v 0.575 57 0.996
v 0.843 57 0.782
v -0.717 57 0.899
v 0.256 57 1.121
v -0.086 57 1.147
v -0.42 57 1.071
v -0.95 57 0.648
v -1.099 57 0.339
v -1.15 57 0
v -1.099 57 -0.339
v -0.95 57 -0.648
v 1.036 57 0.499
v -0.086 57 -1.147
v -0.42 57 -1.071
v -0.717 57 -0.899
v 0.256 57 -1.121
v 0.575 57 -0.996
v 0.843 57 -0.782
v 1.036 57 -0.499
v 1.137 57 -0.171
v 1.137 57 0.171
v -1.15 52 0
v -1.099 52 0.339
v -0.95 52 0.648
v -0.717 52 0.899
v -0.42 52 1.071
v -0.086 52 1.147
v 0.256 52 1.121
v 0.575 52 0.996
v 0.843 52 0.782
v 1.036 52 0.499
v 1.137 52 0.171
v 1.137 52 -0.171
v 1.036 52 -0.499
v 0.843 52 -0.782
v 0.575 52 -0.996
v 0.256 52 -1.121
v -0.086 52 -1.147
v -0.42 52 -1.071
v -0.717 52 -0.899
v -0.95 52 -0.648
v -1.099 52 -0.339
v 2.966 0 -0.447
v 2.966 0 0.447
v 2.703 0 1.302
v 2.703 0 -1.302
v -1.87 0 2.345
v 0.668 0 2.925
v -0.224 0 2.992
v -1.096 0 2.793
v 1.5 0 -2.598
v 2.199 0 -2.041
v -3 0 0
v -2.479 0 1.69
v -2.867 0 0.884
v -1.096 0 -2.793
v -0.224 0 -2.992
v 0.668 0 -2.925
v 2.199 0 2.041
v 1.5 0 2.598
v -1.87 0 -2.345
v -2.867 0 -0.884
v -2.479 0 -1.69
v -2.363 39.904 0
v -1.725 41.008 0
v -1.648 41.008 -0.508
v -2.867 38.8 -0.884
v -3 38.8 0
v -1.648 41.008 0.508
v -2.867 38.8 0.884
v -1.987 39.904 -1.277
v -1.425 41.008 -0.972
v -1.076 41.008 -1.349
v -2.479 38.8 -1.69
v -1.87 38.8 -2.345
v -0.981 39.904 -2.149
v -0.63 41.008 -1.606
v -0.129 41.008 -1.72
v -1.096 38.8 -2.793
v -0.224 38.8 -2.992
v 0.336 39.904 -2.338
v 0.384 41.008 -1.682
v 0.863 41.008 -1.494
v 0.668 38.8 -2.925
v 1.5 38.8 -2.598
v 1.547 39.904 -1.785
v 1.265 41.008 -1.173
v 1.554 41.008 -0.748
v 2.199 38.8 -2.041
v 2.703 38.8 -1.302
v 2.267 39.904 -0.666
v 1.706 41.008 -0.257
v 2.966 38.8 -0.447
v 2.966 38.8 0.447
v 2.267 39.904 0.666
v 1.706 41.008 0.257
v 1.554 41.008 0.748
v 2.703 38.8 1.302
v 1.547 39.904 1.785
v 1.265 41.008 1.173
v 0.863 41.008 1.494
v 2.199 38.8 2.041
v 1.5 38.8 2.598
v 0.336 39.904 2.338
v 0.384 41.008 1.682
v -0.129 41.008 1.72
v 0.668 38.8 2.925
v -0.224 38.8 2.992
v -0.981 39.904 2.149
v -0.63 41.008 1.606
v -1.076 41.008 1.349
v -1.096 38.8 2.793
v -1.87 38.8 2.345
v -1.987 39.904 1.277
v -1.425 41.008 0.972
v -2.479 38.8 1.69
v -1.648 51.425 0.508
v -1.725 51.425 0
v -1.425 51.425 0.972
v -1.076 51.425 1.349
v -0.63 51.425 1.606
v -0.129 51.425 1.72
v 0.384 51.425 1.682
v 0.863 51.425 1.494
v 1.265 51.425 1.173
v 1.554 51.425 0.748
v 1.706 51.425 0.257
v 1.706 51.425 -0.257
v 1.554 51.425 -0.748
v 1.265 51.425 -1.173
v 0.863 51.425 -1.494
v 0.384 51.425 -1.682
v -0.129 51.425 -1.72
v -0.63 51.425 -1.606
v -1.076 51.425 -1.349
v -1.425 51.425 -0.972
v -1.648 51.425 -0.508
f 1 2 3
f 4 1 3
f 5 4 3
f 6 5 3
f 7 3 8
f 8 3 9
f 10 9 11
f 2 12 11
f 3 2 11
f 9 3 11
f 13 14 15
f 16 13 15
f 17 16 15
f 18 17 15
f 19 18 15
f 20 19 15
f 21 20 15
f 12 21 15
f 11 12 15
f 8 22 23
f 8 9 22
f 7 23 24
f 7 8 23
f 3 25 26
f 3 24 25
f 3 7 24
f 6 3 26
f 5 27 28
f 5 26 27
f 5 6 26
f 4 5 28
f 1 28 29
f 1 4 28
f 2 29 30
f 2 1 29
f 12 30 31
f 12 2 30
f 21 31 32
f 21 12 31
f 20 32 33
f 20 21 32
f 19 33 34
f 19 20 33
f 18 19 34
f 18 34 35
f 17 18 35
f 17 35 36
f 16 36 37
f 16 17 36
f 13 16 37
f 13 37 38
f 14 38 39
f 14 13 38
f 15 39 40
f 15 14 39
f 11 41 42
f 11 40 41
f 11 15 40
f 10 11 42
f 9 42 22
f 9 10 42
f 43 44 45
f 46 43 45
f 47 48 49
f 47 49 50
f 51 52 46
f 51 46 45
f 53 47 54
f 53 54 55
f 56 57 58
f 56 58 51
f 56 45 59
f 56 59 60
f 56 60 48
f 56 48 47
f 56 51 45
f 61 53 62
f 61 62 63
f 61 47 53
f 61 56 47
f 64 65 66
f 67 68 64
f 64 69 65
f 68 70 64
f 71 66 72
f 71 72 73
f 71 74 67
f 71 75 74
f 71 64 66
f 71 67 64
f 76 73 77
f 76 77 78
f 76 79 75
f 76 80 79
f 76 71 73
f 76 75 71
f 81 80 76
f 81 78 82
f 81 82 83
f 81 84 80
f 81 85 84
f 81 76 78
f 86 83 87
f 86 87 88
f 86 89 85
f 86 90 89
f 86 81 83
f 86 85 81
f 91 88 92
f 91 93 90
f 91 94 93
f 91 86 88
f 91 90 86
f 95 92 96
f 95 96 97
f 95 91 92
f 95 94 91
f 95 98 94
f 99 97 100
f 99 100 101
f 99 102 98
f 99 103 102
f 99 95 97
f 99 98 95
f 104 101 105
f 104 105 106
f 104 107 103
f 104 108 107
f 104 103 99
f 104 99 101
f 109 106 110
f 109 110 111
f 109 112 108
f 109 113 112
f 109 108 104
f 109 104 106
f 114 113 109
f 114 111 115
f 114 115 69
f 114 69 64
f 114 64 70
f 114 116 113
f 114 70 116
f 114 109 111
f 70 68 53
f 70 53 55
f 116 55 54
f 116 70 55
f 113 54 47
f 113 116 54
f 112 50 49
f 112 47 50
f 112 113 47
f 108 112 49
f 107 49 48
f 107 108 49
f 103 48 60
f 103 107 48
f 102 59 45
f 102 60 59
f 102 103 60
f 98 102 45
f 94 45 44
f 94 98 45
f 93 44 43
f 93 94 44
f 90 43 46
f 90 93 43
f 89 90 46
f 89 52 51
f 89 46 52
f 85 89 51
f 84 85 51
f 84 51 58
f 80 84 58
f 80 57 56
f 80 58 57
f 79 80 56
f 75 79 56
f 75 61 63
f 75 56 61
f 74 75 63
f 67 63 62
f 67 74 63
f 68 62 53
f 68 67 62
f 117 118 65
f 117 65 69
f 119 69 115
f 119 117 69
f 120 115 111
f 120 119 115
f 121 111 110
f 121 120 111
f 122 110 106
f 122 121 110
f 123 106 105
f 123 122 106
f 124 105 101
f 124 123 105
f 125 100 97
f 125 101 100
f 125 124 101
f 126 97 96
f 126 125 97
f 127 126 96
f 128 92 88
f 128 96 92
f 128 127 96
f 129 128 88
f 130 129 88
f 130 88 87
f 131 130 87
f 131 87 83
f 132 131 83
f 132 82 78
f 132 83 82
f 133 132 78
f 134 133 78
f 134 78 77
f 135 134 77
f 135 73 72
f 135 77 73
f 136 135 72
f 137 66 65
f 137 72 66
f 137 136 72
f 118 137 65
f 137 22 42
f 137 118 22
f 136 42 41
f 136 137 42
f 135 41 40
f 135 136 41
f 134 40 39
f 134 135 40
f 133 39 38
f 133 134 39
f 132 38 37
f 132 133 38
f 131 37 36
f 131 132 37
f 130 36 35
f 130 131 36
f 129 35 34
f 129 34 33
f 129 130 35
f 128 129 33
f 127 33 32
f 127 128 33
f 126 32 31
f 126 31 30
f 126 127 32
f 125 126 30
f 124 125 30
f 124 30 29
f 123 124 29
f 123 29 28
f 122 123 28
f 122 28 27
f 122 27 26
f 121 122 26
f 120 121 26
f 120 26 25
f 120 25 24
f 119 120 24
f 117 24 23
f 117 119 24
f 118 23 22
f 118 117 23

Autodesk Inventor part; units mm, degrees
ref_plane "YZ Plane" through (0, 0, 0) normal (1, 0, 0) x (0, 1, 0)
ref_plane "XZ Plane" through (0, 0, 0) normal (0, 1, 0) x (-1, 0, 0)
ref_plane "XY Plane" through (0, 0, 0) normal (0, 0, 1) x (1, 0, 0)
sketch "Sketch1" plane through (0, 0, 0) normal (0, 0, 1) x (1, 0, 0)
  line L0 (-3.6, 0) -> (0.6, 0) construction
  line L1 (0, 0) -> (-3, 0)
  line L2 (-3, 0) -> (-3, 38.8)
  line L3 (-3, 38.8) -> (-1.725, 41.0084)
  line L4 (-1.725, 41.0084) -> (-1.725, 51.425)
  line L5 (-1.725, 51.425) -> (-1.15, 52)
  line L6 (-1.15, 52) -> (-1.15, 57)
  line L7 (-1.15, 57) -> (0, 57)
  line L8 (0, 57) -> (0, 0)
  dimension "d0" = 57
  dimension "d10" = 5
  dimension "d13" = 5.575
  dimension "d16" = 38.8
  dimension "d17" = 6
  dimension "d18" = 3.45
  dimension "d19" = 2.3
  dimension "d20" = 30
  dimension "d21" = 45
revolve "Revolution1" add sketch "Sketch1" angle 360 about axis through (0, 57, 0) along (0, -1, 0)
properties part number "R217.13-023050CC06K 1630"
